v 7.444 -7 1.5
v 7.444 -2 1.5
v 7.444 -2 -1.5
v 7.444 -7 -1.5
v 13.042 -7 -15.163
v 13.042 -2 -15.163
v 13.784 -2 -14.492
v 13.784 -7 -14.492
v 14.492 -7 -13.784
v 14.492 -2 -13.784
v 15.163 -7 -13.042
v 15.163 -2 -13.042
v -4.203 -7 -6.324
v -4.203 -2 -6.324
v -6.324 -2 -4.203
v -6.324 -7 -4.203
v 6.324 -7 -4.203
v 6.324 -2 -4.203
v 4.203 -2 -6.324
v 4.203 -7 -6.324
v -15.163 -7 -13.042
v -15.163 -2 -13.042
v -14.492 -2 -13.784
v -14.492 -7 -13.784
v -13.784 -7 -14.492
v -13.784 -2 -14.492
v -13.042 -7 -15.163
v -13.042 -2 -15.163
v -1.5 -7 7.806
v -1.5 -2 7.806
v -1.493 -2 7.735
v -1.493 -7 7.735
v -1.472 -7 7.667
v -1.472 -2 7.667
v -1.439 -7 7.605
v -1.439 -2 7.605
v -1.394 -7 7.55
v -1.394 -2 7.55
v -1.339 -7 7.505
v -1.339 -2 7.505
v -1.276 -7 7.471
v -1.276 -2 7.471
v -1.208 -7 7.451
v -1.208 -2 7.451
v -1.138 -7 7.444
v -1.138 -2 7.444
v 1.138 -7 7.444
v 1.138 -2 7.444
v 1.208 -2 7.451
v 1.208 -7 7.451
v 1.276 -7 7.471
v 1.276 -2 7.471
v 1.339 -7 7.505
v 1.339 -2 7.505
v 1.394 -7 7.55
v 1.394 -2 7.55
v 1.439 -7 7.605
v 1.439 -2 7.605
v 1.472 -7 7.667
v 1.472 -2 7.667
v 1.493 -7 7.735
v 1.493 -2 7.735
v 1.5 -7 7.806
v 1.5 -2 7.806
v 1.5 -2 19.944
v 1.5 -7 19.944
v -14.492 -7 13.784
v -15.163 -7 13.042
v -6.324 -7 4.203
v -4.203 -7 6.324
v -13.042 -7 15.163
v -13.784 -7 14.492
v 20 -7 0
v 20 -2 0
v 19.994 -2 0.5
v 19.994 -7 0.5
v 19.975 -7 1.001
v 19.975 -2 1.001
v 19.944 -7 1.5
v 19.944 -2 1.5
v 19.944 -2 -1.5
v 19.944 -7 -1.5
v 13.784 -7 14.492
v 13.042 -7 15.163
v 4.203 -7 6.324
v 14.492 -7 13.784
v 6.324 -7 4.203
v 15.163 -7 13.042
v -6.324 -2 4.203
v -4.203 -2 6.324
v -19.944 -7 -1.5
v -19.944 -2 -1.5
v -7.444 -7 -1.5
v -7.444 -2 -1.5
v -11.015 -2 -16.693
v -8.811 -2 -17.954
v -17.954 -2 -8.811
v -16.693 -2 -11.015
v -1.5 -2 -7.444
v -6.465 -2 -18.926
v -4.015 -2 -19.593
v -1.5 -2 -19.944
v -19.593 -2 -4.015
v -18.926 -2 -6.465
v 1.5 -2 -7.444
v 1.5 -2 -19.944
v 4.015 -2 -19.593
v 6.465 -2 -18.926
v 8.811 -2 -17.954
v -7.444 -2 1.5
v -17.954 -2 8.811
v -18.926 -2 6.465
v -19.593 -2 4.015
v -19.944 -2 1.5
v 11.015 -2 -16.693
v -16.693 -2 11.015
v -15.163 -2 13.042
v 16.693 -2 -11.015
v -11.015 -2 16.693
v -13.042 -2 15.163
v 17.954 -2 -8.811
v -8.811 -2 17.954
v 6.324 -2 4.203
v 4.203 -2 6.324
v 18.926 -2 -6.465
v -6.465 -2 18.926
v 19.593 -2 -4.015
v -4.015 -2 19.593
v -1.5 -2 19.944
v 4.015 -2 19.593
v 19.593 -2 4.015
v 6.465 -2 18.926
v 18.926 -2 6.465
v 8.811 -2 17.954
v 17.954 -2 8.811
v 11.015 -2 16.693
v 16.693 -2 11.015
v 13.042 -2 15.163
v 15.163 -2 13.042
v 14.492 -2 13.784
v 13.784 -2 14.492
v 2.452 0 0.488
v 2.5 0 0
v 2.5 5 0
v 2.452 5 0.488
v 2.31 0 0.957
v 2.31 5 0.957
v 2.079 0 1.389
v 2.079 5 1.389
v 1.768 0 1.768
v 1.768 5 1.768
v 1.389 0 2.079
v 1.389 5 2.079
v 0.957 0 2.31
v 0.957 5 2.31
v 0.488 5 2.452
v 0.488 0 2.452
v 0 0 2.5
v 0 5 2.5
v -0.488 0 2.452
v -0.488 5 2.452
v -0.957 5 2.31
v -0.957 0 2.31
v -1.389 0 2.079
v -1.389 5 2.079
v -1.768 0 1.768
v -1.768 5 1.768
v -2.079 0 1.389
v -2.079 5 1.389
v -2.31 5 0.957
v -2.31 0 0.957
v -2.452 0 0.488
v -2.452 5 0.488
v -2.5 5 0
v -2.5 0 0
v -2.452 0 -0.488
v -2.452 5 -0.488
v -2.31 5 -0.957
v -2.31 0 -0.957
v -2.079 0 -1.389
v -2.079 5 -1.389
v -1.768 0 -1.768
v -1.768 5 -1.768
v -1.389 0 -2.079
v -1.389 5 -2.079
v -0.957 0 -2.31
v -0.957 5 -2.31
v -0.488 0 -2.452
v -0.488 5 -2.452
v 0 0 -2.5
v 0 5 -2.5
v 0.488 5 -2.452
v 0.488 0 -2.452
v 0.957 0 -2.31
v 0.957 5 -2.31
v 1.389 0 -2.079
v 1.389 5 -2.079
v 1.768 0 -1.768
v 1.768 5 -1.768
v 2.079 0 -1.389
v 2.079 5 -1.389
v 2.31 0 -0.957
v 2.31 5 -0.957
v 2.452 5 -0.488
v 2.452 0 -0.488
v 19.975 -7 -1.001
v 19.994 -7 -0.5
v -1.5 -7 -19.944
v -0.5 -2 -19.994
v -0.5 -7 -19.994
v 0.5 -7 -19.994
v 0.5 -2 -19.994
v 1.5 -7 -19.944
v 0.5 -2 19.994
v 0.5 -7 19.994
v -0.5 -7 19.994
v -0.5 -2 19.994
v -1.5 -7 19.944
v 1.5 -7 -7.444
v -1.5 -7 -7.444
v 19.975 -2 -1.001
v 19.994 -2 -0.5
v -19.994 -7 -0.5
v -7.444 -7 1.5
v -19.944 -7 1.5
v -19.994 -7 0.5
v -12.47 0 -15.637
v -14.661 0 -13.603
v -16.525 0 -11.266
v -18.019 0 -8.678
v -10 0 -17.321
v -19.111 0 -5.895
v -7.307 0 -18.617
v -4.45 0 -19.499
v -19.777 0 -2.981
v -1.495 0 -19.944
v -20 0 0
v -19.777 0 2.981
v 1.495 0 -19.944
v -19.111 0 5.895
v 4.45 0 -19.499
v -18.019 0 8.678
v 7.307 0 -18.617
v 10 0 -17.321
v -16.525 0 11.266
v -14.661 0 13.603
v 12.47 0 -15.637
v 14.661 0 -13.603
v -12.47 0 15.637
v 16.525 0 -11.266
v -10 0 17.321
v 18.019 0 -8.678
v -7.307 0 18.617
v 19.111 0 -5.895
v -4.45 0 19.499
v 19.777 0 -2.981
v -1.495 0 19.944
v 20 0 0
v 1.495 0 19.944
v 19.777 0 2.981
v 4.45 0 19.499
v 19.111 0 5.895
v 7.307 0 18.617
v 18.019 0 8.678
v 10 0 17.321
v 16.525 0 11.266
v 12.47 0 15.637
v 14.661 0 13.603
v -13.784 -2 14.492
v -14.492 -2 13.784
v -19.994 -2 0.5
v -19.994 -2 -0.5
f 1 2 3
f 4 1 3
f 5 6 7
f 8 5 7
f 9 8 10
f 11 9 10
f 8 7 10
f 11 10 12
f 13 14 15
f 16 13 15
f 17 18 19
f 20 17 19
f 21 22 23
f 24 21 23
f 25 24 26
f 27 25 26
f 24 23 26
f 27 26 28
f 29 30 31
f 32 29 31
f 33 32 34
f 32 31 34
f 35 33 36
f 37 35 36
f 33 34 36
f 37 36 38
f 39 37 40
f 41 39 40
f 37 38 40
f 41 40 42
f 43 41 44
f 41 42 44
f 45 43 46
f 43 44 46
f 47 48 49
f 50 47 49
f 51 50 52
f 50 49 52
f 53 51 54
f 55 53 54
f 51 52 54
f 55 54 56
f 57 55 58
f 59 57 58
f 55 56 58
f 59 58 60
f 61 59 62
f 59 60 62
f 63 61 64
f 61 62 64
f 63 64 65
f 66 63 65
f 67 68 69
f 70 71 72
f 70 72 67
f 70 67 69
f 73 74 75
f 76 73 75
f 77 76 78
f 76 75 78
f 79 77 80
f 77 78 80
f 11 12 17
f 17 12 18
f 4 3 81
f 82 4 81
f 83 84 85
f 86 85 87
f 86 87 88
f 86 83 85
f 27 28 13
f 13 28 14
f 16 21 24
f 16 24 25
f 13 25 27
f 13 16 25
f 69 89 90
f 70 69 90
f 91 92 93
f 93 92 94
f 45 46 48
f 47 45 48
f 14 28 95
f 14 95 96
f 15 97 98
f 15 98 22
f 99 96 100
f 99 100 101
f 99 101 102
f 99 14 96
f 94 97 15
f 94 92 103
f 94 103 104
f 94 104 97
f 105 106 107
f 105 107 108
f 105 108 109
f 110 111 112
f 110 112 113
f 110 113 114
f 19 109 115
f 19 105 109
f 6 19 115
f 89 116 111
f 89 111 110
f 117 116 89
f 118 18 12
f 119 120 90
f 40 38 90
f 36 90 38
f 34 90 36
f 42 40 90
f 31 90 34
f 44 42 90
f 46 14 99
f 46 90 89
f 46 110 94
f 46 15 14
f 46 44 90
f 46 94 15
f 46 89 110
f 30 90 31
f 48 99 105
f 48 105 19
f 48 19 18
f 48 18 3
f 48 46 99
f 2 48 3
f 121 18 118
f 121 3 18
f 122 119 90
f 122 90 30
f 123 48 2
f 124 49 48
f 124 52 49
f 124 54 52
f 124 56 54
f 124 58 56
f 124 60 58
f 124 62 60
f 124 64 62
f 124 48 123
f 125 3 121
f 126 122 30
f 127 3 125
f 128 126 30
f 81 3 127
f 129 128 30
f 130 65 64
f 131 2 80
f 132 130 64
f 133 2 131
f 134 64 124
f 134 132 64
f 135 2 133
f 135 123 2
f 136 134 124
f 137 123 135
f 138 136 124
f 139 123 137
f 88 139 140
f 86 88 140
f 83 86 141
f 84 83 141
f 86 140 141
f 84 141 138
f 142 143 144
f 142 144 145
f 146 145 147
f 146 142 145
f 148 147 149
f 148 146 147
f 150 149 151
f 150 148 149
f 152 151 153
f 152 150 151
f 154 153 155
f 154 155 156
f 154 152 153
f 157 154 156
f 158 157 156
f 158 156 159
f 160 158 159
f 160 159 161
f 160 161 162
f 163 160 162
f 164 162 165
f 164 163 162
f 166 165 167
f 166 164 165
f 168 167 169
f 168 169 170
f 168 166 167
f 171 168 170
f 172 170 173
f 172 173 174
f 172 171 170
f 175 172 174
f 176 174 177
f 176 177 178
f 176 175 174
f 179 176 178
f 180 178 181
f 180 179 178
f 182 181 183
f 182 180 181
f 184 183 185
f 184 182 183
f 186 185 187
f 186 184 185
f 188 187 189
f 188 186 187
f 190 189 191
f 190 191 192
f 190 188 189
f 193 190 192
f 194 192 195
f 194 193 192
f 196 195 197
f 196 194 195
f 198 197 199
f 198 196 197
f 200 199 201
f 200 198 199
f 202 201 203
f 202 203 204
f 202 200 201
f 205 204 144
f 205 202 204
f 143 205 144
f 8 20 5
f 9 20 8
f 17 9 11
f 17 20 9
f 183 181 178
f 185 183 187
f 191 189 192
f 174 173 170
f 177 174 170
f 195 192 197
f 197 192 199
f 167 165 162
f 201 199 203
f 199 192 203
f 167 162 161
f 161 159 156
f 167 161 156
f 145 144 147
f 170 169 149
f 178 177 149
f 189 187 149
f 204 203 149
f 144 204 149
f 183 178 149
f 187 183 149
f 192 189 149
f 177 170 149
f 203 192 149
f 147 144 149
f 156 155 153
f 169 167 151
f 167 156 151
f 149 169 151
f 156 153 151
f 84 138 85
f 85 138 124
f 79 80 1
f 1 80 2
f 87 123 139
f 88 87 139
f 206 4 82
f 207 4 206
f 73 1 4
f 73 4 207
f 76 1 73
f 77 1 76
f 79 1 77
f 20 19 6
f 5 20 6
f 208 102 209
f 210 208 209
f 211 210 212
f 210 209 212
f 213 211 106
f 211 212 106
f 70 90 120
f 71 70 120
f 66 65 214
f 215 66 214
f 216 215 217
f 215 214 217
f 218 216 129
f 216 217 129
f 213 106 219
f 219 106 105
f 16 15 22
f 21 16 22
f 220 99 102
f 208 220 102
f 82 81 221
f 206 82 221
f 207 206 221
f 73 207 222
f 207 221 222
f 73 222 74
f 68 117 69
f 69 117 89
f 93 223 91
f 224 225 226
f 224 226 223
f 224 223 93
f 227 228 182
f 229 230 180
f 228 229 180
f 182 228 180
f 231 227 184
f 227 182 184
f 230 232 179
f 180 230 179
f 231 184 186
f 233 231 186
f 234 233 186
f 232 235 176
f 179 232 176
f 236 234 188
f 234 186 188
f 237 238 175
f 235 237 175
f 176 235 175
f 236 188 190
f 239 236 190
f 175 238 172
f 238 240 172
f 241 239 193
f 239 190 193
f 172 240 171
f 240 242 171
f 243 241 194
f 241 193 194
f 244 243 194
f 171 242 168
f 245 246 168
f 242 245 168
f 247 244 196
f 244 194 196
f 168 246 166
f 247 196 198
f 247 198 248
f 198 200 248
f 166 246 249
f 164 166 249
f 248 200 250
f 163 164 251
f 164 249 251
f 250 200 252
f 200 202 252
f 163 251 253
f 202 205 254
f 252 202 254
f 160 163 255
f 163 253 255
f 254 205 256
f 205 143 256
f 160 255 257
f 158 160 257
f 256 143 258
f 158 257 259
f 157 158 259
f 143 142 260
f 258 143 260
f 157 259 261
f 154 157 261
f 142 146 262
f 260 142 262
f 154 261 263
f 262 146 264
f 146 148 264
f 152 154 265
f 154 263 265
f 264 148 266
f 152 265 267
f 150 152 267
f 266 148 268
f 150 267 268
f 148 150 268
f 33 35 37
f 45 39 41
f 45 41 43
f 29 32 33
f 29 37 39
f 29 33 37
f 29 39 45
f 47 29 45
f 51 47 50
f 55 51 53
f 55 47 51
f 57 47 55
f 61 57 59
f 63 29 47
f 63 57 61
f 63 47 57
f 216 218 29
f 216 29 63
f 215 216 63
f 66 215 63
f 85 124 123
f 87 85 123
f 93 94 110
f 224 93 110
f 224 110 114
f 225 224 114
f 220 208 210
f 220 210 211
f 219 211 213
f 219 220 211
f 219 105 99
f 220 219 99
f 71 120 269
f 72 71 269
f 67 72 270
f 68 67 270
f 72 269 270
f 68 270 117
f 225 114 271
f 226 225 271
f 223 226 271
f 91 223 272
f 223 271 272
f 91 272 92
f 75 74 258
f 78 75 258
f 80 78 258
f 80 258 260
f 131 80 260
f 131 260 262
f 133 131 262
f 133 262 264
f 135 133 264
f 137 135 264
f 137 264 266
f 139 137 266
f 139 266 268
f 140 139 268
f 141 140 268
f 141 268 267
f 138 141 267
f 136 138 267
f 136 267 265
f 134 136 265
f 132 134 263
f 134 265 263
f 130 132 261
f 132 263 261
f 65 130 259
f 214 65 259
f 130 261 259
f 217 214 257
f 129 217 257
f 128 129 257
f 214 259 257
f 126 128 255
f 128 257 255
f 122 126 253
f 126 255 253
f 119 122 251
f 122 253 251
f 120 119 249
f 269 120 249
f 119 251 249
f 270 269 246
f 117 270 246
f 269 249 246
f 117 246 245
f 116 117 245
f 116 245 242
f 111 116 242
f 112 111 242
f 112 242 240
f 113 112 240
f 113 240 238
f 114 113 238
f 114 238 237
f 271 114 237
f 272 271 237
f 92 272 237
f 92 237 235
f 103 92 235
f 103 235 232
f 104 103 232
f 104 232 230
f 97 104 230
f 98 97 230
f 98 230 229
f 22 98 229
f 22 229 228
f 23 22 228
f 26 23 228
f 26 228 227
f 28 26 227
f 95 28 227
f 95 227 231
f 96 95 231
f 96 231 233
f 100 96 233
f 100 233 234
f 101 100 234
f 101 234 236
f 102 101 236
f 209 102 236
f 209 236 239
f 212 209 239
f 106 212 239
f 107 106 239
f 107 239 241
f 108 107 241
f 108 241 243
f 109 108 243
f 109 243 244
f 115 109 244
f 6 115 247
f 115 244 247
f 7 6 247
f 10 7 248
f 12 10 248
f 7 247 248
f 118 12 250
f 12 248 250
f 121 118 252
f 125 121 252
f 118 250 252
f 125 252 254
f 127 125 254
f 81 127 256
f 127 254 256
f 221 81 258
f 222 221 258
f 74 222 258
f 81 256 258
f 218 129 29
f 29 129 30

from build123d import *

# Parameters (mm, degrees)
F0_R     = 20
F1_DEPTH = 2
F3_DEPTH = 5
F4_R     = 2.5
F5_DEPTH = 5


with BuildPart() as f1:
    # F0 (on Front) → F1 (new body)
    with BuildSketch(Plane.XZ):
        Circle(F0_R)
    extrude(amount=F1_DEPTH)

    # F2 (on face) → F3 (join)
    with BuildSketch(Plane.XZ.offset(2)):
        with BuildLine():
            Line((-4.20281, 6.32413), (-13.041645, 15.162965))
            ThreePointArc((-13.041645, 15.162965), (-14.142136, 14.142136), (-15.162965, 13.041645))
            Line((-15.162965, 13.041645), (-6.32413, 4.20281))
            Line((-6.32413, 4.20281), (-5.26347, 5.26347))
            Line((-5.26347, 5.26347), (-4.20281, 6.32413))
        make_face()
        with BuildLine():
            Line((-7.443671, 1.5), (-19.943671, 1.5))
            ThreePointArc((-19.943671, 1.5), (-20, 0), (-19.943671, -1.5))
            Line((-19.943671, -1.5), (-7.443671, -1.5))
            Line((-7.443671, -1.5), (-7.443671, 0))
            Line((-7.443671, 0), (-7.443671, 1.5))
        make_face()
        with BuildLine():
            Line((-6.32413, -4.20281), (-15.162965, -13.041645))
            ThreePointArc((-15.162965, -13.041645), (-14.142136, -14.142136), (-13.041645, -15.162965))
            Line((-13.041645, -15.162965), (-4.20281, -6.32413))
            Line((-4.20281, -6.32413), (-5.26347, -5.26347))
            Line((-5.26347, -5.26347), (-6.32413, -4.20281))
        make_face()
        with BuildLine():
            Line((-1.5, -7.443671), (-1.5, -19.943671))
            ThreePointArc((-1.5, -19.943671), (0, -20), (1.5, -19.943671))
            Line((1.5, -19.943671), (1.5, -7.443671))
            Line((1.5, -7.443671), (0, -7.443671))
            Line((0, -7.443671), (-1.5, -7.443671))
        make_face()
        with BuildLine():
            ThreePointArc((-1.5, 7.805948), (-1.393892, 7.549779), (-1.137723, 7.443671))
            Line((-1.137723, 7.443671), (0, 7.443671))
            Line((0, 7.443671), (1.137723, 7.443671))
            ThreePointArc((1.137723, 7.443671), (1.393892, 7.549779), (1.5, 7.805948))
            Line((1.5, 7.805948), (1.5, 19.943671))
            ThreePointArc((1.5, 19.943671), (0, 20), (-1.5, 19.943671))
            Line((-1.5, 19.943671), (-1.5, 7.805948))
        make_face()
        with BuildLine():
            ThreePointArc((15.162965, 13.041645), (14.142136, 14.142136), (13.041645, 15.162965))
            Line((13.041645, 15.162965), (4.20281, 6.32413))
            Line((4.20281, 6.32413), (5.26347, 5.26347))
            Line((5.26347, 5.26347), (6.32413, 4.20281))
            Line((6.32413, 4.20281), (15.162965, 13.041645))
        make_face()
        with BuildLine():
            ThreePointArc((20, 0), (19.985913, 0.750529), (19.943671, 1.5))
            Line((19.943671, 1.5), (7.443671, 1.5))
            Line((7.443671, 1.5), (7.443671, 0))
            Line((7.443671, 0), (7.443671, -1.5))
            Line((7.443671, -1.5), (19.943671, -1.5))
            ThreePointArc((19.943671, -1.5), (19.985913, -0.750529), (20, 0))
        make_face()
        with BuildLine():
            ThreePointArc((13.041645, -15.162965), (14.142136, -14.142136), (15.162965, -13.041645))
            Line((15.162965, -13.041645), (6.32413, -4.20281))
            Line((6.32413, -4.20281), (5.26347, -5.26347))
            Line((5.26347, -5.26347), (4.20281, -6.32413))
            Line((4.20281, -6.32413), (13.041645, -15.162965))
        make_face()
    extrude(amount=F3_DEPTH)

    # F4 (on face) → F5 (join)
    with BuildSketch(Plane.XZ):
        Circle(F4_R)
    extrude(amount=-F5_DEPTH)


solid = f1.part
